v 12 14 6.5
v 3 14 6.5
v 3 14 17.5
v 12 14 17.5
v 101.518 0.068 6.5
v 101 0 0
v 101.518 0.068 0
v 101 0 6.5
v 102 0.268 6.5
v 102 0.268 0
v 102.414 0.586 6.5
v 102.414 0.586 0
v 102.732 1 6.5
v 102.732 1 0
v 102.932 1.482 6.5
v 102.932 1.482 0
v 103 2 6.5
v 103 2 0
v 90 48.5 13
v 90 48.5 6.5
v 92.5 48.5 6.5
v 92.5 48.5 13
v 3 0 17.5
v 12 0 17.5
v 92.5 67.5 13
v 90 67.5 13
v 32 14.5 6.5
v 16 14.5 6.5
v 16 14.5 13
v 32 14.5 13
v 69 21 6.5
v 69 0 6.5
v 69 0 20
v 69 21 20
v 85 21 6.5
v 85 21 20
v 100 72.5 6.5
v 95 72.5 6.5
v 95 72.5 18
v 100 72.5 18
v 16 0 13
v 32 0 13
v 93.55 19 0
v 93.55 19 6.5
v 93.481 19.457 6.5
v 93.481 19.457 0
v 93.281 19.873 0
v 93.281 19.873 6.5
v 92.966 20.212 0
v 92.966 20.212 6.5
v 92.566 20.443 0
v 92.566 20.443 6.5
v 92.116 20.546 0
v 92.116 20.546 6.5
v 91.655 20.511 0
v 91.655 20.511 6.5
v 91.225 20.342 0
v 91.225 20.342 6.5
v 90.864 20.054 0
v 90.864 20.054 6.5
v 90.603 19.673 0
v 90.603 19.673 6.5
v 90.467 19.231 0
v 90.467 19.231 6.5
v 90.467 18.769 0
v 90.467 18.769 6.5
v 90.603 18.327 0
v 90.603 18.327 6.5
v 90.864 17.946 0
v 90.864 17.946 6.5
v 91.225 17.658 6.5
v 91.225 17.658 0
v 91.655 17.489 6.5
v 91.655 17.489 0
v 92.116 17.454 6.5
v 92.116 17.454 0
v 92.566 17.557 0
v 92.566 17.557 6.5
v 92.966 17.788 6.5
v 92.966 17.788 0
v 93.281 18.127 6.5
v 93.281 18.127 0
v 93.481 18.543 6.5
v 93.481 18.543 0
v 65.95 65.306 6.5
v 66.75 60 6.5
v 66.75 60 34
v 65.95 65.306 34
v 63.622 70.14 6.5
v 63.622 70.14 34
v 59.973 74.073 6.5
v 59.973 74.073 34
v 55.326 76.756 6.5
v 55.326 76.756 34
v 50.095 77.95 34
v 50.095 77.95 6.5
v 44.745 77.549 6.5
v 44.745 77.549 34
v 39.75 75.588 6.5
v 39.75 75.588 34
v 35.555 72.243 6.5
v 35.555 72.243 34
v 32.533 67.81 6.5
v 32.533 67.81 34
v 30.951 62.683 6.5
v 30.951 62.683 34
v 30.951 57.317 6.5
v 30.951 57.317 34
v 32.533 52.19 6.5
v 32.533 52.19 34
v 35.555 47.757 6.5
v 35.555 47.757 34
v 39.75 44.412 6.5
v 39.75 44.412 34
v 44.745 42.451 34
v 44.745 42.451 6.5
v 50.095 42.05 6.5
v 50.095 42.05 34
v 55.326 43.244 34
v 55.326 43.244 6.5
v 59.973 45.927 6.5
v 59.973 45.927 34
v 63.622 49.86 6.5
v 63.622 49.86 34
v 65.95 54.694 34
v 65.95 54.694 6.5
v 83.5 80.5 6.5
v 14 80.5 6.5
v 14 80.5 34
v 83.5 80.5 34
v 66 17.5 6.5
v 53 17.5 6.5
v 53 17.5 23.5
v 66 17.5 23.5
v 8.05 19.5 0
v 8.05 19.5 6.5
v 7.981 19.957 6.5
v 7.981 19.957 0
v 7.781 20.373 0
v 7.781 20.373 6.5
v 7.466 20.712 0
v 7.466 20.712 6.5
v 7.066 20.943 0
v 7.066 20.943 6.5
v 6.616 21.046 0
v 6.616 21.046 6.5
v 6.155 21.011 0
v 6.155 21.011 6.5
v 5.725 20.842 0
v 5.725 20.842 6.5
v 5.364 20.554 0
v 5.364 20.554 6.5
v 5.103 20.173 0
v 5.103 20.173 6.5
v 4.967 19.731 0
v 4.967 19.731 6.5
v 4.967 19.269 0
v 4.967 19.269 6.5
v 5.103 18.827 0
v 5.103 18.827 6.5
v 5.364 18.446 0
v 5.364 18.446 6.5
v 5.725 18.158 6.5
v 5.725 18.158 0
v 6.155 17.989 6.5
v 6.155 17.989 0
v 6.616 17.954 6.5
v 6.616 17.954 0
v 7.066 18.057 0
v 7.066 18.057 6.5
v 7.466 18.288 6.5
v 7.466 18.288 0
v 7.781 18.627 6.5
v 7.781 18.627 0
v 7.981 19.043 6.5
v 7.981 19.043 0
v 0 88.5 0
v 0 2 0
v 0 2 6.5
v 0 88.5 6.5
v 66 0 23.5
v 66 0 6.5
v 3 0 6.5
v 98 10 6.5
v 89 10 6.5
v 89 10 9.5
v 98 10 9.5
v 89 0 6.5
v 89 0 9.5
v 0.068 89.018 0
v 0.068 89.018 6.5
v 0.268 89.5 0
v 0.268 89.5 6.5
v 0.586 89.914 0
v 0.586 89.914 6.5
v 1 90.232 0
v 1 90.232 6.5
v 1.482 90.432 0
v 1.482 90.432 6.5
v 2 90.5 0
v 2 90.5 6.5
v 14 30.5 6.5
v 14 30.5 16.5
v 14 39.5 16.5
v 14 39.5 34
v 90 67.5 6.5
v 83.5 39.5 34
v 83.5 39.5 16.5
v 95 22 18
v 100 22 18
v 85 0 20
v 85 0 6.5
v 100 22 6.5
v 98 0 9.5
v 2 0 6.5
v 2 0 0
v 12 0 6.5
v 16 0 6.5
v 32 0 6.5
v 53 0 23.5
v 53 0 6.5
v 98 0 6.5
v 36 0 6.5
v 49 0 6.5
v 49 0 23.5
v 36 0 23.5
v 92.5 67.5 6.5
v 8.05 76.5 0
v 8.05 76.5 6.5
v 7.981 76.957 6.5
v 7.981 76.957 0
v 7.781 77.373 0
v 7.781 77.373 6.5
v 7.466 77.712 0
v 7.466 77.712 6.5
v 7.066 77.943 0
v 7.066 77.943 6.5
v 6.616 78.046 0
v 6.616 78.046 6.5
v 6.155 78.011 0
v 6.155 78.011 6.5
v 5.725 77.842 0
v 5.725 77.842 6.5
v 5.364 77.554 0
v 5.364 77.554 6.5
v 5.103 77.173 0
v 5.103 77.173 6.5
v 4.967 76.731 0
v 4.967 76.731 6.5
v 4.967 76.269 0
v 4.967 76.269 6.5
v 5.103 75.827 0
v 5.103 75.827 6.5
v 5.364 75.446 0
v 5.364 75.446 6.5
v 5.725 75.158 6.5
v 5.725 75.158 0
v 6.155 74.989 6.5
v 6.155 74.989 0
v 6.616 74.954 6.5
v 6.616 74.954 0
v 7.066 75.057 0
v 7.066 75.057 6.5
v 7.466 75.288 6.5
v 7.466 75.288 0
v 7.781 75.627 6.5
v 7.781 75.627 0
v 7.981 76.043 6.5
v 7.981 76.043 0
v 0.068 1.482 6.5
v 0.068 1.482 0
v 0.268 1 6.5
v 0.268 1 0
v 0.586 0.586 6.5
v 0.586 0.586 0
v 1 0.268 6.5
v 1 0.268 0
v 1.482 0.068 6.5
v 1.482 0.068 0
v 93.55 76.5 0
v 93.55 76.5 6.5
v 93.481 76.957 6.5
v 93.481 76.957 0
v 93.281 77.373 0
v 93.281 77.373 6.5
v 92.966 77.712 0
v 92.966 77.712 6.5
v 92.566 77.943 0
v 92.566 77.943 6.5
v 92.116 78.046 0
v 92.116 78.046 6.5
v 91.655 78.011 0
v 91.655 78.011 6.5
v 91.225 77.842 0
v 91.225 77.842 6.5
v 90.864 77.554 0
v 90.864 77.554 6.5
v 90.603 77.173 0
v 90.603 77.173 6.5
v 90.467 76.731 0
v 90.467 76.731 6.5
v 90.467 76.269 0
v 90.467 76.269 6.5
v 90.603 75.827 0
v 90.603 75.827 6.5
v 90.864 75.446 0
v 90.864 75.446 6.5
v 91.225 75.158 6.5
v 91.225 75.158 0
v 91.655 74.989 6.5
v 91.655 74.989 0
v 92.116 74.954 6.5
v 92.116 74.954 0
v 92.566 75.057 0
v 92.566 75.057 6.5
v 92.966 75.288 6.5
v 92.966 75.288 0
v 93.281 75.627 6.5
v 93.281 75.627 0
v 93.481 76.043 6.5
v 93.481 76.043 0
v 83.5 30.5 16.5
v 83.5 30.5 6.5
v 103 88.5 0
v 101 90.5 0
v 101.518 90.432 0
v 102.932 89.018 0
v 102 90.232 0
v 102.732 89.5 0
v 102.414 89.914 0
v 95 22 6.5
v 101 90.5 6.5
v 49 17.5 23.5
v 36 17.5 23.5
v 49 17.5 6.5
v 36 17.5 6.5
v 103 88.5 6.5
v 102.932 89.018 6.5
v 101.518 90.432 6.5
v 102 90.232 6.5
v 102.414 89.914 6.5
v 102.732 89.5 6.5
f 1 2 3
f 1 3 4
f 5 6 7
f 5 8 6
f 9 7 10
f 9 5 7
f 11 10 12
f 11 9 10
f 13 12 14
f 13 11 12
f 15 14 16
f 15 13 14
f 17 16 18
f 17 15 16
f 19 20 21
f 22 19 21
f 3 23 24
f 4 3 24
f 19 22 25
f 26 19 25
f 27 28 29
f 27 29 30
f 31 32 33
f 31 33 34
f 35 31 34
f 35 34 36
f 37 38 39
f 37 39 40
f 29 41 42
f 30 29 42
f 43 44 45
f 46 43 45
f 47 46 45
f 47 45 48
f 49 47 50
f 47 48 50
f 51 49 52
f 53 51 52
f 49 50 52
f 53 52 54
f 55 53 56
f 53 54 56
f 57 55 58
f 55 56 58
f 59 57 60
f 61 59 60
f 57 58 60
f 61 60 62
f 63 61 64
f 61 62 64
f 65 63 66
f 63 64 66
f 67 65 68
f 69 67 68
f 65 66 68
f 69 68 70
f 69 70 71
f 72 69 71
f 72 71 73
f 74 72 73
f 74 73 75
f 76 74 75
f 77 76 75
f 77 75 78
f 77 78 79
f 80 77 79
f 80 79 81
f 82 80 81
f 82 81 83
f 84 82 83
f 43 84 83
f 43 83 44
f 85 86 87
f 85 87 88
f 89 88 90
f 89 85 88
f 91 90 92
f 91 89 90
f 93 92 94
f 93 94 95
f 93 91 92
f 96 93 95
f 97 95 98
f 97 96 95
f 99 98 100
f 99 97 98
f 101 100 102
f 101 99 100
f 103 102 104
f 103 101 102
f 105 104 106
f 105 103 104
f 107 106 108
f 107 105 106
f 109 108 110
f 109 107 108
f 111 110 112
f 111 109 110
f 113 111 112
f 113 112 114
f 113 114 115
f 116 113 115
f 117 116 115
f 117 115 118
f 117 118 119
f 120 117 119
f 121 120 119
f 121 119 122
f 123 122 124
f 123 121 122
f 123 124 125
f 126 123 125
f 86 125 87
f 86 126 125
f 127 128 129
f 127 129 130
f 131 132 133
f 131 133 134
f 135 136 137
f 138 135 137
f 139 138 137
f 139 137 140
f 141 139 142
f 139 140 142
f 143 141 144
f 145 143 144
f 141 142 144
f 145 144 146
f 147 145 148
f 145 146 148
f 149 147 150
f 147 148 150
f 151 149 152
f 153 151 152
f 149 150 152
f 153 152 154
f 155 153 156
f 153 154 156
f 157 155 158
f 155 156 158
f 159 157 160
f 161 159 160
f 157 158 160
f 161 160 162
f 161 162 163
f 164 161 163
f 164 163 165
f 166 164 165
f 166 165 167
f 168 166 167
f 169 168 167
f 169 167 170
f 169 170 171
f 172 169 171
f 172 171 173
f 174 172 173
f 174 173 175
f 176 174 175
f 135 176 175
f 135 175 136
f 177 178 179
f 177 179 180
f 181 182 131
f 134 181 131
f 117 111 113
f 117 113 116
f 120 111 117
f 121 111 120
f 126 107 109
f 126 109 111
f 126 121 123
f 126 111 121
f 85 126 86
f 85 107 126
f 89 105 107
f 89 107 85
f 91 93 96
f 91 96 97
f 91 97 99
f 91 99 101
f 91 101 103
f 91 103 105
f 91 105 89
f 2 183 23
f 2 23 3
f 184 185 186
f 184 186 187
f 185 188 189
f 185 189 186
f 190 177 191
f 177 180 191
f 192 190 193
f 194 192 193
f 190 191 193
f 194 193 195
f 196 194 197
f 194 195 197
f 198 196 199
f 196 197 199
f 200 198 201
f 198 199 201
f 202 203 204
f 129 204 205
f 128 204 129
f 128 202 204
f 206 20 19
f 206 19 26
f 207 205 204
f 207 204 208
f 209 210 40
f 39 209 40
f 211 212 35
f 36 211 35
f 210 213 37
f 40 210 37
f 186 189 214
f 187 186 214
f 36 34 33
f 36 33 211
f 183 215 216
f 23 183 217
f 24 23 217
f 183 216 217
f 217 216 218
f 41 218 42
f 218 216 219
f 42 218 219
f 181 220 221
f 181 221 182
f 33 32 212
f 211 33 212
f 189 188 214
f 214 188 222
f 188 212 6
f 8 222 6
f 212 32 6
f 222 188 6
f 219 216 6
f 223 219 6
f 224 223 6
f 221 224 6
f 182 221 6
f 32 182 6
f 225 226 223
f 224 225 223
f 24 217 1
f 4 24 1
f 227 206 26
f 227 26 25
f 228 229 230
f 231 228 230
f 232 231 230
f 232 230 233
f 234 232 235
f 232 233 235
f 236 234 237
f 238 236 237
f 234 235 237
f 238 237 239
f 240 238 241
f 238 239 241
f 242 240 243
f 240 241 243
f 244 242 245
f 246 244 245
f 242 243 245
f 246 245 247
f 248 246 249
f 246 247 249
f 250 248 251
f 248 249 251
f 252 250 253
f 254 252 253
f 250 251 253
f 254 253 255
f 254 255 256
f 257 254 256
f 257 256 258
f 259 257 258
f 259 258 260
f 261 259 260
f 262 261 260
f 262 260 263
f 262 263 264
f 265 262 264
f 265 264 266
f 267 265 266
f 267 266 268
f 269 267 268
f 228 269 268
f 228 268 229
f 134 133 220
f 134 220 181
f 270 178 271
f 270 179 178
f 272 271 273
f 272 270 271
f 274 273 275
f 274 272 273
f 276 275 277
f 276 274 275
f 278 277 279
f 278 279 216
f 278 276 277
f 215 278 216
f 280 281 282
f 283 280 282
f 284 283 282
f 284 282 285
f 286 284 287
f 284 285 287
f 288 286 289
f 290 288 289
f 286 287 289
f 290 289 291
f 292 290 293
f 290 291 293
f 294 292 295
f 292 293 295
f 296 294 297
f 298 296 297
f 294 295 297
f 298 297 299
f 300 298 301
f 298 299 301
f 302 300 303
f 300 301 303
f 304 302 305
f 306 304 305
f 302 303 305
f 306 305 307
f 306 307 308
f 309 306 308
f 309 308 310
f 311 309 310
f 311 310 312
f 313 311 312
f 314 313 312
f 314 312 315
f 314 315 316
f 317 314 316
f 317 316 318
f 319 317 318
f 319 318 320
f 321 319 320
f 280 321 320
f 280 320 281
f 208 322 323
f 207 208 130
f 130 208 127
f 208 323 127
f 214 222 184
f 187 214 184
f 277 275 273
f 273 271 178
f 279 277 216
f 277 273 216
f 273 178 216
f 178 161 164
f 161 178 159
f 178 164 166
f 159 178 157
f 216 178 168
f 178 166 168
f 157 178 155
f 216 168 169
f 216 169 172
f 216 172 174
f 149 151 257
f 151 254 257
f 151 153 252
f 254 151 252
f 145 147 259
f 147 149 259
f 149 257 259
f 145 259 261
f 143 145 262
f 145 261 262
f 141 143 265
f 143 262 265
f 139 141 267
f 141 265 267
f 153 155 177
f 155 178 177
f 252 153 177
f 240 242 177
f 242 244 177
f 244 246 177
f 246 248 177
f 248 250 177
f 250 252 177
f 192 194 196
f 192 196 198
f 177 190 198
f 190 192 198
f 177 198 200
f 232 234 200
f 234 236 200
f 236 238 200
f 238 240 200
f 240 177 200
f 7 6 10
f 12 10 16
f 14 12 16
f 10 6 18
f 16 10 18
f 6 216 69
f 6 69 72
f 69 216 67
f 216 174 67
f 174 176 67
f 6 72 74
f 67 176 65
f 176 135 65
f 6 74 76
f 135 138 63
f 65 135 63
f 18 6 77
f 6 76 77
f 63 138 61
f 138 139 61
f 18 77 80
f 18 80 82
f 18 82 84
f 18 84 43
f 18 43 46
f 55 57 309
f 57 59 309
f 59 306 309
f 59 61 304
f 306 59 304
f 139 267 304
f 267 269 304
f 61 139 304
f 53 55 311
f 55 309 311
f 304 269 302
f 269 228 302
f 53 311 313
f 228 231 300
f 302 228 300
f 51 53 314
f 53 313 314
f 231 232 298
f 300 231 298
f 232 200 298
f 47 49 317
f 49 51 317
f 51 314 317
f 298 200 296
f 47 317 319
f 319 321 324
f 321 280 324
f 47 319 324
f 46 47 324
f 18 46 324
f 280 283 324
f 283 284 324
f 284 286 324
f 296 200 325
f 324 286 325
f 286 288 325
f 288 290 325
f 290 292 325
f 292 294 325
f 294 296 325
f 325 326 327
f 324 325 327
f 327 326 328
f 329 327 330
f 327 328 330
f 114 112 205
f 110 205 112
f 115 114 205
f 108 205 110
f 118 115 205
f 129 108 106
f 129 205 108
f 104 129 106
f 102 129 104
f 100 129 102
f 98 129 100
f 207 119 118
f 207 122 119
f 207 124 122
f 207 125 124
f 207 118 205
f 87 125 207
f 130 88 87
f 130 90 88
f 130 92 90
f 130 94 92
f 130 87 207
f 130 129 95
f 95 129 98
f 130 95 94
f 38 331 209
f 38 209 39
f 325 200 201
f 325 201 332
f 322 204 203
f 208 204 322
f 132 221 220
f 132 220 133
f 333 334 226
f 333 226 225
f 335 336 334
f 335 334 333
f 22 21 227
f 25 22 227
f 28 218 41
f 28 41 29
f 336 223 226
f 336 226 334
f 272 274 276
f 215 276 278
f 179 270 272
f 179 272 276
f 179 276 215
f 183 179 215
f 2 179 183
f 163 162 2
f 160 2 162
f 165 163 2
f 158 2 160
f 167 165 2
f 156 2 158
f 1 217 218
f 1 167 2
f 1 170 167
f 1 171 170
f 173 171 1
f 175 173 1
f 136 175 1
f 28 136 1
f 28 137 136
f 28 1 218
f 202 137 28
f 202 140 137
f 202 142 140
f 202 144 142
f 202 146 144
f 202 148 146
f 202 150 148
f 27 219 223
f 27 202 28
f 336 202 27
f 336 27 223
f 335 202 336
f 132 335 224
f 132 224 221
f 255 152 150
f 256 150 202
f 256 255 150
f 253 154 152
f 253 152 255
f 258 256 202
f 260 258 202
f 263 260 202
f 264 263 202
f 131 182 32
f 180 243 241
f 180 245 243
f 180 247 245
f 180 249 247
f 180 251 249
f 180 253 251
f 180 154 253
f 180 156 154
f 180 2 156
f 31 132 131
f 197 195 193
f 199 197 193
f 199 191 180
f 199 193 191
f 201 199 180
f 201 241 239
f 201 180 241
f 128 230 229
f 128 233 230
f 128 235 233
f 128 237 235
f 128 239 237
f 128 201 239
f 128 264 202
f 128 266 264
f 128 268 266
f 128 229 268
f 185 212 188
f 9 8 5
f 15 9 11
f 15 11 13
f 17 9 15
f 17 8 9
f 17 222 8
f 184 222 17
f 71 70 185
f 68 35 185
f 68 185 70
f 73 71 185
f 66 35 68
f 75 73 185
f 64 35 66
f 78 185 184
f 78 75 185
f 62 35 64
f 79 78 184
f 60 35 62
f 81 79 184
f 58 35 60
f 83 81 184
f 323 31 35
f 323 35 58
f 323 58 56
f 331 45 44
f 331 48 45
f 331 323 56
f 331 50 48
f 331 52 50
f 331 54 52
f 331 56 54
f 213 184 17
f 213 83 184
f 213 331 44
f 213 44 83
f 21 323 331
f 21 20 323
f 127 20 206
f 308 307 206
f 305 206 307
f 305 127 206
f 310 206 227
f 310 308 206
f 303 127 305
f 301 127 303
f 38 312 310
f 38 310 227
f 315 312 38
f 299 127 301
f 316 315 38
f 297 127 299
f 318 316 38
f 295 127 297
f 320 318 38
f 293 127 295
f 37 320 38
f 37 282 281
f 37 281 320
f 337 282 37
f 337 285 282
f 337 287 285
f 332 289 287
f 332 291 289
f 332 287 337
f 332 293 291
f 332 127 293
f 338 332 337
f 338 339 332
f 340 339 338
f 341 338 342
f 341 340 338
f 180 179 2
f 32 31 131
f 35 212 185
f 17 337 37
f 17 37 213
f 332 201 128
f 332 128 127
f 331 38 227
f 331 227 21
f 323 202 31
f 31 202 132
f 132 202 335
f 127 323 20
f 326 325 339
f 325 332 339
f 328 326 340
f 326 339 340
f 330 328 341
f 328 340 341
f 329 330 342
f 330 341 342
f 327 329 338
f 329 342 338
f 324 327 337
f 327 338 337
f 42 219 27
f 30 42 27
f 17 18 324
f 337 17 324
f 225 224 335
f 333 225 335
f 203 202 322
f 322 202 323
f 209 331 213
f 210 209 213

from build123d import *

# Parameters (mm, degrees)
SKETCH_1_W          = 103
SKETCH_1_H          = 90.5
EXTRUDE_1_DEPTH     = 6.5
SKETCH_2_W          = 9
SKETCH_2_H          = 14
SKETCH_2_W_2        = 16
SKETCH_2_H_2        = 14.5
SKETCH_2_W_3        = 13
SKETCH_2_H_3        = 17.5
SKETCH_2_H_4        = 21
SKETCH_2_H_5        = 10
SKETCH_2_W_4        = 69.5
SKETCH_2_H_6        = 50
SKETCH_2_R          = 18
SKETCH_2_W_5        = 2.5
SKETCH_2_H_7        = 19
SKETCH_2_W_6        = 5
SKETCH_2_H_8        = 50.5
EXTRUDE_2_DEPTH     = 27.5
CUT_EXTRUDE_1_REACH = 143.263
SKETCH_3_W          = 9
SKETCH_3_H          = 16.5
SKETCH_3_W_2        = 16
SKETCH_3_H_2        = 21
SKETCH_3_W_3        = 13
SKETCH_3_H_3        = 10.5
SKETCH_3_H_4        = 14
SKETCH_3_H_5        = 24.5
SKETCH_4_W          = 69.5
SKETCH_4_H          = 9
CUT_EXTRUDE_2_DEPTH = 17.5
SKETCH_5_R          = 1.55
CUT_EXTRUDE_3_DEPTH = 140.840981118
CUT_EXTRUDE_4_REACH = 135.8
SKETCH_6_W          = 21
SKETCH_6_H          = 19
CUT_EXTRUDE_5_REACH = 141.091
SKETCH_7_W          = 16
SKETCH_7_H          = 50.5
FILLET_1_R          = 2


with BuildPart() as part:
    # 草图1 → 凸台-拉伸1 (new body)
    with BuildSketch(Plane.XY):
        with Locations((51.5, 45.25)):
            Rectangle(SKETCH_1_W, SKETCH_1_H)
    extrude(amount=EXTRUDE_1_DEPTH)

    # 草图2 → 凸台-拉伸2 (add)
    # profile 1 of 9: a face of its own
    with BuildSketch(Plane.XY.offset(6.5)):
        with Locations((7.5, 7)):
            Rectangle(SKETCH_2_W, SKETCH_2_H)
    # profile 2 of 9: a face of its own
    with BuildSketch(Plane.XY.offset(6.5)):
        with Locations((24, 7.25)):
            Rectangle(SKETCH_2_W_2, SKETCH_2_H_2)
    # profile 3 of 9: a face of its own
    with BuildSketch(Plane.XY.offset(6.5)):
        with Locations((42.5, 8.75)):
            Rectangle(SKETCH_2_W_3, SKETCH_2_H_3)
    # profile 4 of 9: a face of its own
    with BuildSketch(Plane.XY.offset(6.5)):
        with Locations((59.5, 8.75)):
            Rectangle(SKETCH_2_W_3, SKETCH_2_H_3)
    # profile 5 of 9: a face of its own
    with BuildSketch(Plane.XY.offset(6.5)):
        with Locations((77, 10.5)):
            Rectangle(SKETCH_2_W_2, SKETCH_2_H_4)
    # profile 6 of 9: a face of its own
    with BuildSketch(Plane.XY.offset(6.5)):
        with Locations((93.5, 5)):
            Rectangle(SKETCH_2_W, SKETCH_2_H_5)
    # profile 7 of 9: a face of its own
    with BuildSketch(Plane.XY.offset(6.5)):
        with Locations((48.75, 55.5)):
            Rectangle(SKETCH_2_W_4, SKETCH_2_H_6)
        with Locations((48.75, 60)):
            Circle(SKETCH_2_R, mode=Mode.SUBTRACT)
    # profile 8 of 9: a face of its own
    with BuildSketch(Plane.XY.offset(6.5)):
        with Locations((91.25, 58)):
            Rectangle(SKETCH_2_W_5, SKETCH_2_H_7)
    # profile 9 of 9: a face of its own
    with BuildSketch(Plane.XY.offset(6.5)):
        with Locations((97.5, 47.25)):
            Rectangle(SKETCH_2_W_6, SKETCH_2_H_8)
    extrude(amount=EXTRUDE_2_DEPTH)

    # 草图3 → 切除-拉伸1 (cut, up to next)
    with BuildSketch(Plane.XZ, mode=Mode.PRIVATE) as cut_extrude_1_sk1:
        with Locations((7.5, 25.75)):
            Rectangle(SKETCH_3_W, SKETCH_3_H)
    cut_extrude_1_tool1 = extrude(cut_extrude_1_sk1.sketch, amount=-CUT_EXTRUDE_1_REACH, mode=Mode.PRIVATE) & part.part
    # 草图3 → 切除-拉伸1 (cut, up to next)
    with BuildSketch(Plane.XZ, mode=Mode.PRIVATE) as cut_extrude_1_sk2:
        with Locations((24, 23.5)):
            Rectangle(SKETCH_3_W_2, SKETCH_3_H_2)
    cut_extrude_1_tool2 = extrude(cut_extrude_1_sk2.sketch, amount=-CUT_EXTRUDE_1_REACH, mode=Mode.PRIVATE) & part.part
    # 草图3 → 切除-拉伸1 (cut, up to next)
    with BuildSketch(Plane.XZ, mode=Mode.PRIVATE) as cut_extrude_1_sk3:
        with Locations((42.5, 28.75)):
            Rectangle(SKETCH_3_W_3, SKETCH_3_H_3)
    cut_extrude_1_tool3 = extrude(cut_extrude_1_sk3.sketch, amount=-CUT_EXTRUDE_1_REACH, mode=Mode.PRIVATE) & part.part
    # 草图3 → 切除-拉伸1 (cut, up to next)
    with BuildSketch(Plane.XZ, mode=Mode.PRIVATE) as cut_extrude_1_sk4:
        with Locations((59.5, 28.75)):
            Rectangle(SKETCH_3_W_3, SKETCH_3_H_3)
    cut_extrude_1_tool4 = extrude(cut_extrude_1_sk4.sketch, amount=-CUT_EXTRUDE_1_REACH, mode=Mode.PRIVATE) & part.part
    # 草图3 → 切除-拉伸1 (cut, up to next)
    with BuildSketch(Plane.XZ, mode=Mode.PRIVATE) as cut_extrude_1_sk5:
        with Locations((77, 27)):
            Rectangle(SKETCH_3_W_2, SKETCH_3_H_4)
    cut_extrude_1_tool5 = extrude(cut_extrude_1_sk5.sketch, amount=-CUT_EXTRUDE_1_REACH, mode=Mode.PRIVATE) & part.part
    # 草图3 → 切除-拉伸1 (cut, up to next)
    with BuildSketch(Plane.XZ, mode=Mode.PRIVATE) as cut_extrude_1_sk6:
        with Locations((93.5, 21.75)):
            Rectangle(SKETCH_3_W, SKETCH_3_H_5)
    cut_extrude_1_tool6 = extrude(cut_extrude_1_sk6.sketch, amount=-CUT_EXTRUDE_1_REACH, mode=Mode.PRIVATE) & part.part
    add(cut_extrude_1_tool1.solids().sort_by_distance((7.5, 0, 25.75))[0], mode=Mode.SUBTRACT)
    add(cut_extrude_1_tool2.solids().sort_by_distance((24, 0, 23.5))[0], mode=Mode.SUBTRACT)
    add(cut_extrude_1_tool3.solids().sort_by_distance((42.5, 0, 28.75))[0], mode=Mode.SUBTRACT)
    add(cut_extrude_1_tool4.solids().sort_by_distance((59.5, 0, 28.75))[0], mode=Mode.SUBTRACT)
    add(cut_extrude_1_tool5.solids().sort_by_distance((77, 0, 27))[0], mode=Mode.SUBTRACT)
    add(cut_extrude_1_tool6.solids().sort_by_distance((93.5, 0, 21.75))[0], mode=Mode.SUBTRACT)

    # 草图4 → 切除-拉伸2 (cut)
    with BuildSketch(Plane.XY.offset(34)):
        with Locations((48.75, 35)):
            Rectangle(SKETCH_4_W, SKETCH_4_H)
    extrude(amount=-CUT_EXTRUDE_2_DEPTH, mode=Mode.SUBTRACT)

    # 草图5 → 切除-拉伸3 (cut, through all)
    with BuildSketch(Plane.XY.offset(6.5)):
        with Locations((92, 19)):
            Circle(SKETCH_5_R)
        with Locations((92, 76.5)):
            Circle(SKETCH_5_R)
        with Locations((6.5, 76.5)):
            Circle(SKETCH_5_R)
        with Locations((6.5, 19.5)):
            Circle(SKETCH_5_R)
    extrude(amount=-CUT_EXTRUDE_3_DEPTH, mode=Mode.SUBTRACT)

    # 草图6 → 切除-拉伸4 (cut, up to next)
    with BuildSketch(Plane(origin=(92.5, 0, 0), x_dir=(0, 0, -1), z_dir=(1, 0, 0)), mode=Mode.PRIVATE) as cut_extrude_4_sk1:
        with Locations((-23.5, 58)):
            Rectangle(SKETCH_6_W, SKETCH_6_H)
    cut_extrude_4_tool1 = extrude(cut_extrude_4_sk1.sketch, amount=-CUT_EXTRUDE_4_REACH, mode=Mode.PRIVATE) & part.part
    add(cut_extrude_4_tool1.solids().sort_by_distance((92.5, 58, 23.5))[0], mode=Mode.SUBTRACT)

    # 草图7 → 切除-拉伸5 (cut, up to next)
    with BuildSketch(Plane(origin=(100, 0, 0), x_dir=(0, 0, -1), z_dir=(1, 0, 0)), mode=Mode.PRIVATE) as cut_extrude_5_sk1:
        with Locations((-26, 47.25)):
            Rectangle(SKETCH_7_W, SKETCH_7_H)
    cut_extrude_5_tool1 = extrude(cut_extrude_5_sk1.sketch, amount=-CUT_EXTRUDE_5_REACH, mode=Mode.PRIVATE) & part.part
    add(cut_extrude_5_tool1.solids().sort_by_distance((100, 47.25, 26))[0], mode=Mode.SUBTRACT)

    # 圆角1
    fillet_1_edges = [part.edges().sort_by_distance(p)[0] for p in [
        (0, 90.5, 3.25),
        (103, 90.5, 3.25),
        (103, 0, 3.25),
        (0, 0, 3.25),
    ]]
    fillet(fillet_1_edges, radius=FILLET_1_R)


solid = part.part
